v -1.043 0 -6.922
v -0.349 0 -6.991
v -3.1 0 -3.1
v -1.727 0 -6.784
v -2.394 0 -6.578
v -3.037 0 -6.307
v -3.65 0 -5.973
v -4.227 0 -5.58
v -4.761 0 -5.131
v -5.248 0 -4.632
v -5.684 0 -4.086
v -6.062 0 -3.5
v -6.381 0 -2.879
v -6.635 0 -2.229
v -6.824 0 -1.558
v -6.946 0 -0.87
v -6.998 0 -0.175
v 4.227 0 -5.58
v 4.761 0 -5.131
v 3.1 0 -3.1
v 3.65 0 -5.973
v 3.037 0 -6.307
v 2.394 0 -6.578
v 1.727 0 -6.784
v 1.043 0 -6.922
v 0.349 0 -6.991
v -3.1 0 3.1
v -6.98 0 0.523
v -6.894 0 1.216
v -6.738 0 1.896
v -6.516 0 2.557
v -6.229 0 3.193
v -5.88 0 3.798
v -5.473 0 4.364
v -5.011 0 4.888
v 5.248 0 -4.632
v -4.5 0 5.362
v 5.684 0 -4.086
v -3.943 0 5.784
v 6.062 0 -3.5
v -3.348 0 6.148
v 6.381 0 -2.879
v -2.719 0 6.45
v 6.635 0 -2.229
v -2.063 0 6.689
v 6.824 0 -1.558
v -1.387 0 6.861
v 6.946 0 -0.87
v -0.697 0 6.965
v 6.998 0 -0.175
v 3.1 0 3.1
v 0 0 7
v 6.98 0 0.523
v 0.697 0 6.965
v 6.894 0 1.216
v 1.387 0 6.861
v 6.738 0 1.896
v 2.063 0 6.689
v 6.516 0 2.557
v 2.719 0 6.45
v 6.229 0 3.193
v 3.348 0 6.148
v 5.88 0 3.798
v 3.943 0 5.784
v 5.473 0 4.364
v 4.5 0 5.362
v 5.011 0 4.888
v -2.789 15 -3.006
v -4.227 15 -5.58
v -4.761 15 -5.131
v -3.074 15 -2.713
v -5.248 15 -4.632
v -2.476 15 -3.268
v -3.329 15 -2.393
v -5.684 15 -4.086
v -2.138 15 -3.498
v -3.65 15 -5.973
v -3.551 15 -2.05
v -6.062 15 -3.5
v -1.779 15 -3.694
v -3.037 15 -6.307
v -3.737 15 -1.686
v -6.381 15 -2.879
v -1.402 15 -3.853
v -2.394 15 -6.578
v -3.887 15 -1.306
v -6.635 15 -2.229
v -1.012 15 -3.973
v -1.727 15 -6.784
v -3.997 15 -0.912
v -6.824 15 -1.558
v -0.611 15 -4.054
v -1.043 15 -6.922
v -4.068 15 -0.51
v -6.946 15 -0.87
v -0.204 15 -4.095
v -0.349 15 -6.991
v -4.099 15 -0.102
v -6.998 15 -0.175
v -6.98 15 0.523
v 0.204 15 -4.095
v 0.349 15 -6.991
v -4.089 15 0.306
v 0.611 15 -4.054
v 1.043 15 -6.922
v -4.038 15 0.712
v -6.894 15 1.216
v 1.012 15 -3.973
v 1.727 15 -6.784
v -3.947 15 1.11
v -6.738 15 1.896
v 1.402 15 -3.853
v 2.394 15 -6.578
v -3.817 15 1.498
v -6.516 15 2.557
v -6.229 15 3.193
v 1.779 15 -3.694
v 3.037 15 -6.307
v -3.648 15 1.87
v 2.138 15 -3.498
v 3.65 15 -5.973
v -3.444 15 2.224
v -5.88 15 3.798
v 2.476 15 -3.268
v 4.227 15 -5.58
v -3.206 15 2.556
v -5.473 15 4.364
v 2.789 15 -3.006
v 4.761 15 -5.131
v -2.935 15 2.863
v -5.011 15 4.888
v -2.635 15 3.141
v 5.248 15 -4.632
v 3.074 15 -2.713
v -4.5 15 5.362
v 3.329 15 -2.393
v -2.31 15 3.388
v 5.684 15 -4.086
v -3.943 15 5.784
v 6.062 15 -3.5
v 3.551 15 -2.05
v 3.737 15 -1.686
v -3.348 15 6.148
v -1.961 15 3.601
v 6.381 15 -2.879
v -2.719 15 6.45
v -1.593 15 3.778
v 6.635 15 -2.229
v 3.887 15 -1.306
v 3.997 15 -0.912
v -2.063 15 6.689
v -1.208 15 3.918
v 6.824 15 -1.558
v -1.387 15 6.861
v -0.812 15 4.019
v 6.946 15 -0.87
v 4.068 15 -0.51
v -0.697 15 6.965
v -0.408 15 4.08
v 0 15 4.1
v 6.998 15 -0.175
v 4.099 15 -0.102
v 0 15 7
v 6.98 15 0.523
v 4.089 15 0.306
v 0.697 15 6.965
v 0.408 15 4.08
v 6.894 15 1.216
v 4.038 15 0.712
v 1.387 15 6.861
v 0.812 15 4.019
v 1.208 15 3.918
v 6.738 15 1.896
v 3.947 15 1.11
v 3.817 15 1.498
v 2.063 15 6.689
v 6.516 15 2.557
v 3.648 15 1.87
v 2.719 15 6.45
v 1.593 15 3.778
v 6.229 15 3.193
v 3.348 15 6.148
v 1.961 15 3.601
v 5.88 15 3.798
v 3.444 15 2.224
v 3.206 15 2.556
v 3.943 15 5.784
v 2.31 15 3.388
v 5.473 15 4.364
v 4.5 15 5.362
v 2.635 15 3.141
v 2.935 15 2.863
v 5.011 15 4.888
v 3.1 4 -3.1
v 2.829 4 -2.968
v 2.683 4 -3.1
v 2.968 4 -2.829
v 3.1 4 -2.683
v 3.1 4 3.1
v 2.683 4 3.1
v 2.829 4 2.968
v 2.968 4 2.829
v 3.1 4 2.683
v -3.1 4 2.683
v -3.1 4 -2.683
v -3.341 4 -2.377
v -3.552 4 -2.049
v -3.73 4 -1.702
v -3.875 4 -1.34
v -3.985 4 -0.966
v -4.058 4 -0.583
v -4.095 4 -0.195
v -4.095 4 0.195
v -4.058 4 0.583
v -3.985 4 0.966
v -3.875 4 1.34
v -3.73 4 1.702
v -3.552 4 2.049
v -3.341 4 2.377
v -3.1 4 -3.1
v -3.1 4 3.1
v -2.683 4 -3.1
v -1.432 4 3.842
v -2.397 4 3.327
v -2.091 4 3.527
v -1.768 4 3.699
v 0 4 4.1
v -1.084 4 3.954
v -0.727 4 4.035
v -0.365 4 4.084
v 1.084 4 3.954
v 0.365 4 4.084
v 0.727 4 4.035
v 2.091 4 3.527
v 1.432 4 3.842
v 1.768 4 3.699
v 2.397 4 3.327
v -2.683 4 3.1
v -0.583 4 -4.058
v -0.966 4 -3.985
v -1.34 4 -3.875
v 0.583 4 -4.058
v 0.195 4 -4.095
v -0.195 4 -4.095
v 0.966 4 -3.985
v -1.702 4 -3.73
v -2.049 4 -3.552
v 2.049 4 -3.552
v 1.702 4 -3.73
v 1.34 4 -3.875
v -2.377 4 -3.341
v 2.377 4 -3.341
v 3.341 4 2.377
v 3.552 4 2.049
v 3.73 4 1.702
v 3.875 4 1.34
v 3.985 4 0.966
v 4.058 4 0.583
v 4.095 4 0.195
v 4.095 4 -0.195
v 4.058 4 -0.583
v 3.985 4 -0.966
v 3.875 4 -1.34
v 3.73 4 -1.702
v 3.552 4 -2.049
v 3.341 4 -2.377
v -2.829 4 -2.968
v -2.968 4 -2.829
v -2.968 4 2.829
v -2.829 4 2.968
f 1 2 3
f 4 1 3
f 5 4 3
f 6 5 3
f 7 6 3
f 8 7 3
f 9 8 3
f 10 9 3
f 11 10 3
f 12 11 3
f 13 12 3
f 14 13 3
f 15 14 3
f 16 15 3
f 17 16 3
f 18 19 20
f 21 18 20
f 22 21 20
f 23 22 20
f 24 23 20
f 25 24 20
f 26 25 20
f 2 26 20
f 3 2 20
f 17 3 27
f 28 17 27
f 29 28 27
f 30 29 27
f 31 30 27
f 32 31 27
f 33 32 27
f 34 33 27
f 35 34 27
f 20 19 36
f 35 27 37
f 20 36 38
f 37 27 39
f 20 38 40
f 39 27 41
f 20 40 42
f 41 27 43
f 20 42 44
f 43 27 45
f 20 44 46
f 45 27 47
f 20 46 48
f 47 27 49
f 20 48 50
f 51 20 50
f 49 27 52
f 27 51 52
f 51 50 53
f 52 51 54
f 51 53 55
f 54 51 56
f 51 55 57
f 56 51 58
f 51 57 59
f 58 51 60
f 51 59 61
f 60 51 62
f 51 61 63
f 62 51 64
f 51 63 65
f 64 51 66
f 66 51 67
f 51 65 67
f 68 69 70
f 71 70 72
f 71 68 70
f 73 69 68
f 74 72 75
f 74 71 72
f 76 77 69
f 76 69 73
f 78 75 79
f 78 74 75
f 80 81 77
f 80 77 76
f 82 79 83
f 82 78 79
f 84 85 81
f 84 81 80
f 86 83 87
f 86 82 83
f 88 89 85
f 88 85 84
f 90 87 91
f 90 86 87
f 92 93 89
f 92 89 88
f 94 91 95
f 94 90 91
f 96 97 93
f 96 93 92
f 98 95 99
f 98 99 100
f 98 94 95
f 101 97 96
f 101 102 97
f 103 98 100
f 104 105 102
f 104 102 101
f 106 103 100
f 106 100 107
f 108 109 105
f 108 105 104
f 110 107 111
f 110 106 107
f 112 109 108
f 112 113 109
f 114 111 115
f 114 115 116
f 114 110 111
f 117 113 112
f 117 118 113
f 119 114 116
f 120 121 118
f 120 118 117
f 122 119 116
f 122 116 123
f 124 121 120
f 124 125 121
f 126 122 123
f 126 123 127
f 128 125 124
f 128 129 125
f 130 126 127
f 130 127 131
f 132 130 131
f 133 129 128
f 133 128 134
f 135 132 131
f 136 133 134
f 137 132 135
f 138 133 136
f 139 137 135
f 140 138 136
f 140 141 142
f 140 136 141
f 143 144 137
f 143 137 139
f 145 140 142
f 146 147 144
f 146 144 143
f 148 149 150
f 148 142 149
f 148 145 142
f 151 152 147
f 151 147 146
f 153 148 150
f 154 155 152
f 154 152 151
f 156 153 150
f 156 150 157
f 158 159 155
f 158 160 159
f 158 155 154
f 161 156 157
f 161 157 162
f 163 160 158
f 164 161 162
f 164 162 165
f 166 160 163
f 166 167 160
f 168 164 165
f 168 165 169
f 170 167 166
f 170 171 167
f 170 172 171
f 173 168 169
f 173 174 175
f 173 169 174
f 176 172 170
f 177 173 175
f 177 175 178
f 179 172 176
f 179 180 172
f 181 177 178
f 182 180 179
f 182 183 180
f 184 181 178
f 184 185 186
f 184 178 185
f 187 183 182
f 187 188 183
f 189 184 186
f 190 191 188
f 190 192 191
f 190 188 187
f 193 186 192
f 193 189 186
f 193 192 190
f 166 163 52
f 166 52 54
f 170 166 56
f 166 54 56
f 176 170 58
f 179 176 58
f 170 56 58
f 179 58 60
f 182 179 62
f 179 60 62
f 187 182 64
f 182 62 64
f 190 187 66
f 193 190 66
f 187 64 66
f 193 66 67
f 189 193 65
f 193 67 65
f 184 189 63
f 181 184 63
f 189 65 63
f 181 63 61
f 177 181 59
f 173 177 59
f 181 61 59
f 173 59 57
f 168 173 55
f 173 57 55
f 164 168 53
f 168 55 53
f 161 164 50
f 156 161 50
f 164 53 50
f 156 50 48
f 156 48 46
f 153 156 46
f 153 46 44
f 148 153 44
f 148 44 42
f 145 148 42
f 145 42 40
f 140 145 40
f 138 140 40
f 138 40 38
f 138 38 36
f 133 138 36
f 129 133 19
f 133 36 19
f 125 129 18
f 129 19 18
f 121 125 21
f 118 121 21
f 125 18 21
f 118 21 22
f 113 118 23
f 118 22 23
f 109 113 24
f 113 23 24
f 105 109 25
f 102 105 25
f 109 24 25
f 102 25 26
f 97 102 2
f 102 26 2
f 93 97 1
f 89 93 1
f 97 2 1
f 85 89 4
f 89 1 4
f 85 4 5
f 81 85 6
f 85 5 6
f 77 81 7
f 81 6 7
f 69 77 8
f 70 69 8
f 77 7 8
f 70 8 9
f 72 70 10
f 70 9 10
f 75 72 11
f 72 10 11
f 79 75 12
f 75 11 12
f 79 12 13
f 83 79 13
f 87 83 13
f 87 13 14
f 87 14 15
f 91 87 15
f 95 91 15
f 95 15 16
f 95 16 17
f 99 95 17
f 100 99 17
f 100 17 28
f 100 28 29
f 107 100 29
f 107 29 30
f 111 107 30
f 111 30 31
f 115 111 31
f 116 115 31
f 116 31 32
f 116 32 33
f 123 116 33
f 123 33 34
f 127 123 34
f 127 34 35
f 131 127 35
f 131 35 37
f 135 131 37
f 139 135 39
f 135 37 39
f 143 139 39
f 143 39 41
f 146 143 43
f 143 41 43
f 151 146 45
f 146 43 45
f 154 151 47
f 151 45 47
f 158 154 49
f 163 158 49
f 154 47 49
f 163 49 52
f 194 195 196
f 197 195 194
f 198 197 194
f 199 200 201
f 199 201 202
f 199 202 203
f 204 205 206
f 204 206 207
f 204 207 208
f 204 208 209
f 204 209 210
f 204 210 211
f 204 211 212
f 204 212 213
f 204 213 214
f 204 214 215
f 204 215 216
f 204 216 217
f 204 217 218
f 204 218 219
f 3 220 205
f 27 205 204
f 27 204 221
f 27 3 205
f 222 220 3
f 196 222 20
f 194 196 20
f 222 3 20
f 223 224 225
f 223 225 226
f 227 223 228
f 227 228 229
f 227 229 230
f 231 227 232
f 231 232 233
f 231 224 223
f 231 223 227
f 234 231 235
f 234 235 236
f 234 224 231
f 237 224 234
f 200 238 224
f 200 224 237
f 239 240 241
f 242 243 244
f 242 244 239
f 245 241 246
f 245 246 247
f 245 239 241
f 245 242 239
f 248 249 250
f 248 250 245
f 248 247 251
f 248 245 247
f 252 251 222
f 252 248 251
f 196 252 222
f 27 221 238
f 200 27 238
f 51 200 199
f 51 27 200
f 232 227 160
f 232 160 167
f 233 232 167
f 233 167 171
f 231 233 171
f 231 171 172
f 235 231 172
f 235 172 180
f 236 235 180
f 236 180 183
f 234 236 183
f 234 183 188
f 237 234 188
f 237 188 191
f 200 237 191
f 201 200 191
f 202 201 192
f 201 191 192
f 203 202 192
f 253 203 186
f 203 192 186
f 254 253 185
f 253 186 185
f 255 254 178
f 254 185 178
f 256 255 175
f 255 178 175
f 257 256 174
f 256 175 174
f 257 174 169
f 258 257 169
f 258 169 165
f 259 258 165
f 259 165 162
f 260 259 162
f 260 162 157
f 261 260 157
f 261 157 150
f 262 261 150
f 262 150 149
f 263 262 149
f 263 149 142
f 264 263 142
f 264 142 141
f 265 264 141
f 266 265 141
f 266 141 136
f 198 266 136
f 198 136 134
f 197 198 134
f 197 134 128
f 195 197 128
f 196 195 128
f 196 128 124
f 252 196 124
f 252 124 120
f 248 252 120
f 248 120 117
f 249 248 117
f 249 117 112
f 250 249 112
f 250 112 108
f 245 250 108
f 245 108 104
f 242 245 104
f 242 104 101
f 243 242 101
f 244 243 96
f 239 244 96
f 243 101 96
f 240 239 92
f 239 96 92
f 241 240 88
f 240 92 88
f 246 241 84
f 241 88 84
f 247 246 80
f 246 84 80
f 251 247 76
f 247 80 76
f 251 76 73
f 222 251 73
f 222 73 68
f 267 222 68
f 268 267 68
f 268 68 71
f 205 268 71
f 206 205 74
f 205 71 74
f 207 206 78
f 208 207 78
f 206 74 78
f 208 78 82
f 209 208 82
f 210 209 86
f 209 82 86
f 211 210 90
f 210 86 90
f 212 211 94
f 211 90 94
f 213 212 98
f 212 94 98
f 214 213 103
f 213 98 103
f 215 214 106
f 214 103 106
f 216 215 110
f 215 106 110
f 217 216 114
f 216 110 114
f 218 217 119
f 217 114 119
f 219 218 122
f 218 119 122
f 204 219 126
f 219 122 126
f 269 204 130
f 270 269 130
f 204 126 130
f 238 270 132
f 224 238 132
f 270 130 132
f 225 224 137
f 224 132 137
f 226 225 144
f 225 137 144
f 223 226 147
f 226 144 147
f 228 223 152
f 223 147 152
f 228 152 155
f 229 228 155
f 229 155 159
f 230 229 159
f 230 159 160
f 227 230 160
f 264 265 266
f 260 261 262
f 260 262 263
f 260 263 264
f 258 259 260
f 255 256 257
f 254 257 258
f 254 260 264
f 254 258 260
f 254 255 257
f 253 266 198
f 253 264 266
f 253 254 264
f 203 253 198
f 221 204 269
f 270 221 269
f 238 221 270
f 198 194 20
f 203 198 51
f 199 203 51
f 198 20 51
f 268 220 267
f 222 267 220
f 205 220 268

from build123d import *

# Parameters (mm, degrees)
SKETCH1_R           = 7
BOSS_EXTRUDE3_DEPTH = 15
SKETCH4_R           = 4.1
CUT_EXTRUDE1_DEPTH  = 11
SKETCH5_W           = 6.2
SKETCH5_H           = 6.2
CUT_EXTRUDE2_DEPTH  = 4


with BuildPart() as part:
    # Sketch1 → Boss-Extrude3 (new body)
    with BuildSketch(Plane(origin=(0, 0, 0), x_dir=(1, 0, 0), z_dir=(0, 1, 0))):
        with Locations(Location((0, 0, 0), (0, 0, 270))):  # turned: the seam where the file's is
            Circle(SKETCH1_R)
    extrude(amount=BOSS_EXTRUDE3_DEPTH)

    # Sketch4 → Cut-Extrude1 (cut)
    with BuildSketch(Plane(origin=(0, 15, 0), x_dir=(1, 0, 0), z_dir=(0, 1, 0))):
        with Locations(Location((0, 0, 0), (0, 0, 270))):  # turned: the seam where the file's is
            Circle(SKETCH4_R)
    extrude(amount=-CUT_EXTRUDE1_DEPTH, mode=Mode.SUBTRACT)

    # Sketch5 → Cut-Extrude2 (cut)
    with BuildSketch(Plane.XZ):
        Rectangle(SKETCH5_W, SKETCH5_H)
    extrude(amount=-CUT_EXTRUDE2_DEPTH, mode=Mode.SUBTRACT)


solid = part.part
